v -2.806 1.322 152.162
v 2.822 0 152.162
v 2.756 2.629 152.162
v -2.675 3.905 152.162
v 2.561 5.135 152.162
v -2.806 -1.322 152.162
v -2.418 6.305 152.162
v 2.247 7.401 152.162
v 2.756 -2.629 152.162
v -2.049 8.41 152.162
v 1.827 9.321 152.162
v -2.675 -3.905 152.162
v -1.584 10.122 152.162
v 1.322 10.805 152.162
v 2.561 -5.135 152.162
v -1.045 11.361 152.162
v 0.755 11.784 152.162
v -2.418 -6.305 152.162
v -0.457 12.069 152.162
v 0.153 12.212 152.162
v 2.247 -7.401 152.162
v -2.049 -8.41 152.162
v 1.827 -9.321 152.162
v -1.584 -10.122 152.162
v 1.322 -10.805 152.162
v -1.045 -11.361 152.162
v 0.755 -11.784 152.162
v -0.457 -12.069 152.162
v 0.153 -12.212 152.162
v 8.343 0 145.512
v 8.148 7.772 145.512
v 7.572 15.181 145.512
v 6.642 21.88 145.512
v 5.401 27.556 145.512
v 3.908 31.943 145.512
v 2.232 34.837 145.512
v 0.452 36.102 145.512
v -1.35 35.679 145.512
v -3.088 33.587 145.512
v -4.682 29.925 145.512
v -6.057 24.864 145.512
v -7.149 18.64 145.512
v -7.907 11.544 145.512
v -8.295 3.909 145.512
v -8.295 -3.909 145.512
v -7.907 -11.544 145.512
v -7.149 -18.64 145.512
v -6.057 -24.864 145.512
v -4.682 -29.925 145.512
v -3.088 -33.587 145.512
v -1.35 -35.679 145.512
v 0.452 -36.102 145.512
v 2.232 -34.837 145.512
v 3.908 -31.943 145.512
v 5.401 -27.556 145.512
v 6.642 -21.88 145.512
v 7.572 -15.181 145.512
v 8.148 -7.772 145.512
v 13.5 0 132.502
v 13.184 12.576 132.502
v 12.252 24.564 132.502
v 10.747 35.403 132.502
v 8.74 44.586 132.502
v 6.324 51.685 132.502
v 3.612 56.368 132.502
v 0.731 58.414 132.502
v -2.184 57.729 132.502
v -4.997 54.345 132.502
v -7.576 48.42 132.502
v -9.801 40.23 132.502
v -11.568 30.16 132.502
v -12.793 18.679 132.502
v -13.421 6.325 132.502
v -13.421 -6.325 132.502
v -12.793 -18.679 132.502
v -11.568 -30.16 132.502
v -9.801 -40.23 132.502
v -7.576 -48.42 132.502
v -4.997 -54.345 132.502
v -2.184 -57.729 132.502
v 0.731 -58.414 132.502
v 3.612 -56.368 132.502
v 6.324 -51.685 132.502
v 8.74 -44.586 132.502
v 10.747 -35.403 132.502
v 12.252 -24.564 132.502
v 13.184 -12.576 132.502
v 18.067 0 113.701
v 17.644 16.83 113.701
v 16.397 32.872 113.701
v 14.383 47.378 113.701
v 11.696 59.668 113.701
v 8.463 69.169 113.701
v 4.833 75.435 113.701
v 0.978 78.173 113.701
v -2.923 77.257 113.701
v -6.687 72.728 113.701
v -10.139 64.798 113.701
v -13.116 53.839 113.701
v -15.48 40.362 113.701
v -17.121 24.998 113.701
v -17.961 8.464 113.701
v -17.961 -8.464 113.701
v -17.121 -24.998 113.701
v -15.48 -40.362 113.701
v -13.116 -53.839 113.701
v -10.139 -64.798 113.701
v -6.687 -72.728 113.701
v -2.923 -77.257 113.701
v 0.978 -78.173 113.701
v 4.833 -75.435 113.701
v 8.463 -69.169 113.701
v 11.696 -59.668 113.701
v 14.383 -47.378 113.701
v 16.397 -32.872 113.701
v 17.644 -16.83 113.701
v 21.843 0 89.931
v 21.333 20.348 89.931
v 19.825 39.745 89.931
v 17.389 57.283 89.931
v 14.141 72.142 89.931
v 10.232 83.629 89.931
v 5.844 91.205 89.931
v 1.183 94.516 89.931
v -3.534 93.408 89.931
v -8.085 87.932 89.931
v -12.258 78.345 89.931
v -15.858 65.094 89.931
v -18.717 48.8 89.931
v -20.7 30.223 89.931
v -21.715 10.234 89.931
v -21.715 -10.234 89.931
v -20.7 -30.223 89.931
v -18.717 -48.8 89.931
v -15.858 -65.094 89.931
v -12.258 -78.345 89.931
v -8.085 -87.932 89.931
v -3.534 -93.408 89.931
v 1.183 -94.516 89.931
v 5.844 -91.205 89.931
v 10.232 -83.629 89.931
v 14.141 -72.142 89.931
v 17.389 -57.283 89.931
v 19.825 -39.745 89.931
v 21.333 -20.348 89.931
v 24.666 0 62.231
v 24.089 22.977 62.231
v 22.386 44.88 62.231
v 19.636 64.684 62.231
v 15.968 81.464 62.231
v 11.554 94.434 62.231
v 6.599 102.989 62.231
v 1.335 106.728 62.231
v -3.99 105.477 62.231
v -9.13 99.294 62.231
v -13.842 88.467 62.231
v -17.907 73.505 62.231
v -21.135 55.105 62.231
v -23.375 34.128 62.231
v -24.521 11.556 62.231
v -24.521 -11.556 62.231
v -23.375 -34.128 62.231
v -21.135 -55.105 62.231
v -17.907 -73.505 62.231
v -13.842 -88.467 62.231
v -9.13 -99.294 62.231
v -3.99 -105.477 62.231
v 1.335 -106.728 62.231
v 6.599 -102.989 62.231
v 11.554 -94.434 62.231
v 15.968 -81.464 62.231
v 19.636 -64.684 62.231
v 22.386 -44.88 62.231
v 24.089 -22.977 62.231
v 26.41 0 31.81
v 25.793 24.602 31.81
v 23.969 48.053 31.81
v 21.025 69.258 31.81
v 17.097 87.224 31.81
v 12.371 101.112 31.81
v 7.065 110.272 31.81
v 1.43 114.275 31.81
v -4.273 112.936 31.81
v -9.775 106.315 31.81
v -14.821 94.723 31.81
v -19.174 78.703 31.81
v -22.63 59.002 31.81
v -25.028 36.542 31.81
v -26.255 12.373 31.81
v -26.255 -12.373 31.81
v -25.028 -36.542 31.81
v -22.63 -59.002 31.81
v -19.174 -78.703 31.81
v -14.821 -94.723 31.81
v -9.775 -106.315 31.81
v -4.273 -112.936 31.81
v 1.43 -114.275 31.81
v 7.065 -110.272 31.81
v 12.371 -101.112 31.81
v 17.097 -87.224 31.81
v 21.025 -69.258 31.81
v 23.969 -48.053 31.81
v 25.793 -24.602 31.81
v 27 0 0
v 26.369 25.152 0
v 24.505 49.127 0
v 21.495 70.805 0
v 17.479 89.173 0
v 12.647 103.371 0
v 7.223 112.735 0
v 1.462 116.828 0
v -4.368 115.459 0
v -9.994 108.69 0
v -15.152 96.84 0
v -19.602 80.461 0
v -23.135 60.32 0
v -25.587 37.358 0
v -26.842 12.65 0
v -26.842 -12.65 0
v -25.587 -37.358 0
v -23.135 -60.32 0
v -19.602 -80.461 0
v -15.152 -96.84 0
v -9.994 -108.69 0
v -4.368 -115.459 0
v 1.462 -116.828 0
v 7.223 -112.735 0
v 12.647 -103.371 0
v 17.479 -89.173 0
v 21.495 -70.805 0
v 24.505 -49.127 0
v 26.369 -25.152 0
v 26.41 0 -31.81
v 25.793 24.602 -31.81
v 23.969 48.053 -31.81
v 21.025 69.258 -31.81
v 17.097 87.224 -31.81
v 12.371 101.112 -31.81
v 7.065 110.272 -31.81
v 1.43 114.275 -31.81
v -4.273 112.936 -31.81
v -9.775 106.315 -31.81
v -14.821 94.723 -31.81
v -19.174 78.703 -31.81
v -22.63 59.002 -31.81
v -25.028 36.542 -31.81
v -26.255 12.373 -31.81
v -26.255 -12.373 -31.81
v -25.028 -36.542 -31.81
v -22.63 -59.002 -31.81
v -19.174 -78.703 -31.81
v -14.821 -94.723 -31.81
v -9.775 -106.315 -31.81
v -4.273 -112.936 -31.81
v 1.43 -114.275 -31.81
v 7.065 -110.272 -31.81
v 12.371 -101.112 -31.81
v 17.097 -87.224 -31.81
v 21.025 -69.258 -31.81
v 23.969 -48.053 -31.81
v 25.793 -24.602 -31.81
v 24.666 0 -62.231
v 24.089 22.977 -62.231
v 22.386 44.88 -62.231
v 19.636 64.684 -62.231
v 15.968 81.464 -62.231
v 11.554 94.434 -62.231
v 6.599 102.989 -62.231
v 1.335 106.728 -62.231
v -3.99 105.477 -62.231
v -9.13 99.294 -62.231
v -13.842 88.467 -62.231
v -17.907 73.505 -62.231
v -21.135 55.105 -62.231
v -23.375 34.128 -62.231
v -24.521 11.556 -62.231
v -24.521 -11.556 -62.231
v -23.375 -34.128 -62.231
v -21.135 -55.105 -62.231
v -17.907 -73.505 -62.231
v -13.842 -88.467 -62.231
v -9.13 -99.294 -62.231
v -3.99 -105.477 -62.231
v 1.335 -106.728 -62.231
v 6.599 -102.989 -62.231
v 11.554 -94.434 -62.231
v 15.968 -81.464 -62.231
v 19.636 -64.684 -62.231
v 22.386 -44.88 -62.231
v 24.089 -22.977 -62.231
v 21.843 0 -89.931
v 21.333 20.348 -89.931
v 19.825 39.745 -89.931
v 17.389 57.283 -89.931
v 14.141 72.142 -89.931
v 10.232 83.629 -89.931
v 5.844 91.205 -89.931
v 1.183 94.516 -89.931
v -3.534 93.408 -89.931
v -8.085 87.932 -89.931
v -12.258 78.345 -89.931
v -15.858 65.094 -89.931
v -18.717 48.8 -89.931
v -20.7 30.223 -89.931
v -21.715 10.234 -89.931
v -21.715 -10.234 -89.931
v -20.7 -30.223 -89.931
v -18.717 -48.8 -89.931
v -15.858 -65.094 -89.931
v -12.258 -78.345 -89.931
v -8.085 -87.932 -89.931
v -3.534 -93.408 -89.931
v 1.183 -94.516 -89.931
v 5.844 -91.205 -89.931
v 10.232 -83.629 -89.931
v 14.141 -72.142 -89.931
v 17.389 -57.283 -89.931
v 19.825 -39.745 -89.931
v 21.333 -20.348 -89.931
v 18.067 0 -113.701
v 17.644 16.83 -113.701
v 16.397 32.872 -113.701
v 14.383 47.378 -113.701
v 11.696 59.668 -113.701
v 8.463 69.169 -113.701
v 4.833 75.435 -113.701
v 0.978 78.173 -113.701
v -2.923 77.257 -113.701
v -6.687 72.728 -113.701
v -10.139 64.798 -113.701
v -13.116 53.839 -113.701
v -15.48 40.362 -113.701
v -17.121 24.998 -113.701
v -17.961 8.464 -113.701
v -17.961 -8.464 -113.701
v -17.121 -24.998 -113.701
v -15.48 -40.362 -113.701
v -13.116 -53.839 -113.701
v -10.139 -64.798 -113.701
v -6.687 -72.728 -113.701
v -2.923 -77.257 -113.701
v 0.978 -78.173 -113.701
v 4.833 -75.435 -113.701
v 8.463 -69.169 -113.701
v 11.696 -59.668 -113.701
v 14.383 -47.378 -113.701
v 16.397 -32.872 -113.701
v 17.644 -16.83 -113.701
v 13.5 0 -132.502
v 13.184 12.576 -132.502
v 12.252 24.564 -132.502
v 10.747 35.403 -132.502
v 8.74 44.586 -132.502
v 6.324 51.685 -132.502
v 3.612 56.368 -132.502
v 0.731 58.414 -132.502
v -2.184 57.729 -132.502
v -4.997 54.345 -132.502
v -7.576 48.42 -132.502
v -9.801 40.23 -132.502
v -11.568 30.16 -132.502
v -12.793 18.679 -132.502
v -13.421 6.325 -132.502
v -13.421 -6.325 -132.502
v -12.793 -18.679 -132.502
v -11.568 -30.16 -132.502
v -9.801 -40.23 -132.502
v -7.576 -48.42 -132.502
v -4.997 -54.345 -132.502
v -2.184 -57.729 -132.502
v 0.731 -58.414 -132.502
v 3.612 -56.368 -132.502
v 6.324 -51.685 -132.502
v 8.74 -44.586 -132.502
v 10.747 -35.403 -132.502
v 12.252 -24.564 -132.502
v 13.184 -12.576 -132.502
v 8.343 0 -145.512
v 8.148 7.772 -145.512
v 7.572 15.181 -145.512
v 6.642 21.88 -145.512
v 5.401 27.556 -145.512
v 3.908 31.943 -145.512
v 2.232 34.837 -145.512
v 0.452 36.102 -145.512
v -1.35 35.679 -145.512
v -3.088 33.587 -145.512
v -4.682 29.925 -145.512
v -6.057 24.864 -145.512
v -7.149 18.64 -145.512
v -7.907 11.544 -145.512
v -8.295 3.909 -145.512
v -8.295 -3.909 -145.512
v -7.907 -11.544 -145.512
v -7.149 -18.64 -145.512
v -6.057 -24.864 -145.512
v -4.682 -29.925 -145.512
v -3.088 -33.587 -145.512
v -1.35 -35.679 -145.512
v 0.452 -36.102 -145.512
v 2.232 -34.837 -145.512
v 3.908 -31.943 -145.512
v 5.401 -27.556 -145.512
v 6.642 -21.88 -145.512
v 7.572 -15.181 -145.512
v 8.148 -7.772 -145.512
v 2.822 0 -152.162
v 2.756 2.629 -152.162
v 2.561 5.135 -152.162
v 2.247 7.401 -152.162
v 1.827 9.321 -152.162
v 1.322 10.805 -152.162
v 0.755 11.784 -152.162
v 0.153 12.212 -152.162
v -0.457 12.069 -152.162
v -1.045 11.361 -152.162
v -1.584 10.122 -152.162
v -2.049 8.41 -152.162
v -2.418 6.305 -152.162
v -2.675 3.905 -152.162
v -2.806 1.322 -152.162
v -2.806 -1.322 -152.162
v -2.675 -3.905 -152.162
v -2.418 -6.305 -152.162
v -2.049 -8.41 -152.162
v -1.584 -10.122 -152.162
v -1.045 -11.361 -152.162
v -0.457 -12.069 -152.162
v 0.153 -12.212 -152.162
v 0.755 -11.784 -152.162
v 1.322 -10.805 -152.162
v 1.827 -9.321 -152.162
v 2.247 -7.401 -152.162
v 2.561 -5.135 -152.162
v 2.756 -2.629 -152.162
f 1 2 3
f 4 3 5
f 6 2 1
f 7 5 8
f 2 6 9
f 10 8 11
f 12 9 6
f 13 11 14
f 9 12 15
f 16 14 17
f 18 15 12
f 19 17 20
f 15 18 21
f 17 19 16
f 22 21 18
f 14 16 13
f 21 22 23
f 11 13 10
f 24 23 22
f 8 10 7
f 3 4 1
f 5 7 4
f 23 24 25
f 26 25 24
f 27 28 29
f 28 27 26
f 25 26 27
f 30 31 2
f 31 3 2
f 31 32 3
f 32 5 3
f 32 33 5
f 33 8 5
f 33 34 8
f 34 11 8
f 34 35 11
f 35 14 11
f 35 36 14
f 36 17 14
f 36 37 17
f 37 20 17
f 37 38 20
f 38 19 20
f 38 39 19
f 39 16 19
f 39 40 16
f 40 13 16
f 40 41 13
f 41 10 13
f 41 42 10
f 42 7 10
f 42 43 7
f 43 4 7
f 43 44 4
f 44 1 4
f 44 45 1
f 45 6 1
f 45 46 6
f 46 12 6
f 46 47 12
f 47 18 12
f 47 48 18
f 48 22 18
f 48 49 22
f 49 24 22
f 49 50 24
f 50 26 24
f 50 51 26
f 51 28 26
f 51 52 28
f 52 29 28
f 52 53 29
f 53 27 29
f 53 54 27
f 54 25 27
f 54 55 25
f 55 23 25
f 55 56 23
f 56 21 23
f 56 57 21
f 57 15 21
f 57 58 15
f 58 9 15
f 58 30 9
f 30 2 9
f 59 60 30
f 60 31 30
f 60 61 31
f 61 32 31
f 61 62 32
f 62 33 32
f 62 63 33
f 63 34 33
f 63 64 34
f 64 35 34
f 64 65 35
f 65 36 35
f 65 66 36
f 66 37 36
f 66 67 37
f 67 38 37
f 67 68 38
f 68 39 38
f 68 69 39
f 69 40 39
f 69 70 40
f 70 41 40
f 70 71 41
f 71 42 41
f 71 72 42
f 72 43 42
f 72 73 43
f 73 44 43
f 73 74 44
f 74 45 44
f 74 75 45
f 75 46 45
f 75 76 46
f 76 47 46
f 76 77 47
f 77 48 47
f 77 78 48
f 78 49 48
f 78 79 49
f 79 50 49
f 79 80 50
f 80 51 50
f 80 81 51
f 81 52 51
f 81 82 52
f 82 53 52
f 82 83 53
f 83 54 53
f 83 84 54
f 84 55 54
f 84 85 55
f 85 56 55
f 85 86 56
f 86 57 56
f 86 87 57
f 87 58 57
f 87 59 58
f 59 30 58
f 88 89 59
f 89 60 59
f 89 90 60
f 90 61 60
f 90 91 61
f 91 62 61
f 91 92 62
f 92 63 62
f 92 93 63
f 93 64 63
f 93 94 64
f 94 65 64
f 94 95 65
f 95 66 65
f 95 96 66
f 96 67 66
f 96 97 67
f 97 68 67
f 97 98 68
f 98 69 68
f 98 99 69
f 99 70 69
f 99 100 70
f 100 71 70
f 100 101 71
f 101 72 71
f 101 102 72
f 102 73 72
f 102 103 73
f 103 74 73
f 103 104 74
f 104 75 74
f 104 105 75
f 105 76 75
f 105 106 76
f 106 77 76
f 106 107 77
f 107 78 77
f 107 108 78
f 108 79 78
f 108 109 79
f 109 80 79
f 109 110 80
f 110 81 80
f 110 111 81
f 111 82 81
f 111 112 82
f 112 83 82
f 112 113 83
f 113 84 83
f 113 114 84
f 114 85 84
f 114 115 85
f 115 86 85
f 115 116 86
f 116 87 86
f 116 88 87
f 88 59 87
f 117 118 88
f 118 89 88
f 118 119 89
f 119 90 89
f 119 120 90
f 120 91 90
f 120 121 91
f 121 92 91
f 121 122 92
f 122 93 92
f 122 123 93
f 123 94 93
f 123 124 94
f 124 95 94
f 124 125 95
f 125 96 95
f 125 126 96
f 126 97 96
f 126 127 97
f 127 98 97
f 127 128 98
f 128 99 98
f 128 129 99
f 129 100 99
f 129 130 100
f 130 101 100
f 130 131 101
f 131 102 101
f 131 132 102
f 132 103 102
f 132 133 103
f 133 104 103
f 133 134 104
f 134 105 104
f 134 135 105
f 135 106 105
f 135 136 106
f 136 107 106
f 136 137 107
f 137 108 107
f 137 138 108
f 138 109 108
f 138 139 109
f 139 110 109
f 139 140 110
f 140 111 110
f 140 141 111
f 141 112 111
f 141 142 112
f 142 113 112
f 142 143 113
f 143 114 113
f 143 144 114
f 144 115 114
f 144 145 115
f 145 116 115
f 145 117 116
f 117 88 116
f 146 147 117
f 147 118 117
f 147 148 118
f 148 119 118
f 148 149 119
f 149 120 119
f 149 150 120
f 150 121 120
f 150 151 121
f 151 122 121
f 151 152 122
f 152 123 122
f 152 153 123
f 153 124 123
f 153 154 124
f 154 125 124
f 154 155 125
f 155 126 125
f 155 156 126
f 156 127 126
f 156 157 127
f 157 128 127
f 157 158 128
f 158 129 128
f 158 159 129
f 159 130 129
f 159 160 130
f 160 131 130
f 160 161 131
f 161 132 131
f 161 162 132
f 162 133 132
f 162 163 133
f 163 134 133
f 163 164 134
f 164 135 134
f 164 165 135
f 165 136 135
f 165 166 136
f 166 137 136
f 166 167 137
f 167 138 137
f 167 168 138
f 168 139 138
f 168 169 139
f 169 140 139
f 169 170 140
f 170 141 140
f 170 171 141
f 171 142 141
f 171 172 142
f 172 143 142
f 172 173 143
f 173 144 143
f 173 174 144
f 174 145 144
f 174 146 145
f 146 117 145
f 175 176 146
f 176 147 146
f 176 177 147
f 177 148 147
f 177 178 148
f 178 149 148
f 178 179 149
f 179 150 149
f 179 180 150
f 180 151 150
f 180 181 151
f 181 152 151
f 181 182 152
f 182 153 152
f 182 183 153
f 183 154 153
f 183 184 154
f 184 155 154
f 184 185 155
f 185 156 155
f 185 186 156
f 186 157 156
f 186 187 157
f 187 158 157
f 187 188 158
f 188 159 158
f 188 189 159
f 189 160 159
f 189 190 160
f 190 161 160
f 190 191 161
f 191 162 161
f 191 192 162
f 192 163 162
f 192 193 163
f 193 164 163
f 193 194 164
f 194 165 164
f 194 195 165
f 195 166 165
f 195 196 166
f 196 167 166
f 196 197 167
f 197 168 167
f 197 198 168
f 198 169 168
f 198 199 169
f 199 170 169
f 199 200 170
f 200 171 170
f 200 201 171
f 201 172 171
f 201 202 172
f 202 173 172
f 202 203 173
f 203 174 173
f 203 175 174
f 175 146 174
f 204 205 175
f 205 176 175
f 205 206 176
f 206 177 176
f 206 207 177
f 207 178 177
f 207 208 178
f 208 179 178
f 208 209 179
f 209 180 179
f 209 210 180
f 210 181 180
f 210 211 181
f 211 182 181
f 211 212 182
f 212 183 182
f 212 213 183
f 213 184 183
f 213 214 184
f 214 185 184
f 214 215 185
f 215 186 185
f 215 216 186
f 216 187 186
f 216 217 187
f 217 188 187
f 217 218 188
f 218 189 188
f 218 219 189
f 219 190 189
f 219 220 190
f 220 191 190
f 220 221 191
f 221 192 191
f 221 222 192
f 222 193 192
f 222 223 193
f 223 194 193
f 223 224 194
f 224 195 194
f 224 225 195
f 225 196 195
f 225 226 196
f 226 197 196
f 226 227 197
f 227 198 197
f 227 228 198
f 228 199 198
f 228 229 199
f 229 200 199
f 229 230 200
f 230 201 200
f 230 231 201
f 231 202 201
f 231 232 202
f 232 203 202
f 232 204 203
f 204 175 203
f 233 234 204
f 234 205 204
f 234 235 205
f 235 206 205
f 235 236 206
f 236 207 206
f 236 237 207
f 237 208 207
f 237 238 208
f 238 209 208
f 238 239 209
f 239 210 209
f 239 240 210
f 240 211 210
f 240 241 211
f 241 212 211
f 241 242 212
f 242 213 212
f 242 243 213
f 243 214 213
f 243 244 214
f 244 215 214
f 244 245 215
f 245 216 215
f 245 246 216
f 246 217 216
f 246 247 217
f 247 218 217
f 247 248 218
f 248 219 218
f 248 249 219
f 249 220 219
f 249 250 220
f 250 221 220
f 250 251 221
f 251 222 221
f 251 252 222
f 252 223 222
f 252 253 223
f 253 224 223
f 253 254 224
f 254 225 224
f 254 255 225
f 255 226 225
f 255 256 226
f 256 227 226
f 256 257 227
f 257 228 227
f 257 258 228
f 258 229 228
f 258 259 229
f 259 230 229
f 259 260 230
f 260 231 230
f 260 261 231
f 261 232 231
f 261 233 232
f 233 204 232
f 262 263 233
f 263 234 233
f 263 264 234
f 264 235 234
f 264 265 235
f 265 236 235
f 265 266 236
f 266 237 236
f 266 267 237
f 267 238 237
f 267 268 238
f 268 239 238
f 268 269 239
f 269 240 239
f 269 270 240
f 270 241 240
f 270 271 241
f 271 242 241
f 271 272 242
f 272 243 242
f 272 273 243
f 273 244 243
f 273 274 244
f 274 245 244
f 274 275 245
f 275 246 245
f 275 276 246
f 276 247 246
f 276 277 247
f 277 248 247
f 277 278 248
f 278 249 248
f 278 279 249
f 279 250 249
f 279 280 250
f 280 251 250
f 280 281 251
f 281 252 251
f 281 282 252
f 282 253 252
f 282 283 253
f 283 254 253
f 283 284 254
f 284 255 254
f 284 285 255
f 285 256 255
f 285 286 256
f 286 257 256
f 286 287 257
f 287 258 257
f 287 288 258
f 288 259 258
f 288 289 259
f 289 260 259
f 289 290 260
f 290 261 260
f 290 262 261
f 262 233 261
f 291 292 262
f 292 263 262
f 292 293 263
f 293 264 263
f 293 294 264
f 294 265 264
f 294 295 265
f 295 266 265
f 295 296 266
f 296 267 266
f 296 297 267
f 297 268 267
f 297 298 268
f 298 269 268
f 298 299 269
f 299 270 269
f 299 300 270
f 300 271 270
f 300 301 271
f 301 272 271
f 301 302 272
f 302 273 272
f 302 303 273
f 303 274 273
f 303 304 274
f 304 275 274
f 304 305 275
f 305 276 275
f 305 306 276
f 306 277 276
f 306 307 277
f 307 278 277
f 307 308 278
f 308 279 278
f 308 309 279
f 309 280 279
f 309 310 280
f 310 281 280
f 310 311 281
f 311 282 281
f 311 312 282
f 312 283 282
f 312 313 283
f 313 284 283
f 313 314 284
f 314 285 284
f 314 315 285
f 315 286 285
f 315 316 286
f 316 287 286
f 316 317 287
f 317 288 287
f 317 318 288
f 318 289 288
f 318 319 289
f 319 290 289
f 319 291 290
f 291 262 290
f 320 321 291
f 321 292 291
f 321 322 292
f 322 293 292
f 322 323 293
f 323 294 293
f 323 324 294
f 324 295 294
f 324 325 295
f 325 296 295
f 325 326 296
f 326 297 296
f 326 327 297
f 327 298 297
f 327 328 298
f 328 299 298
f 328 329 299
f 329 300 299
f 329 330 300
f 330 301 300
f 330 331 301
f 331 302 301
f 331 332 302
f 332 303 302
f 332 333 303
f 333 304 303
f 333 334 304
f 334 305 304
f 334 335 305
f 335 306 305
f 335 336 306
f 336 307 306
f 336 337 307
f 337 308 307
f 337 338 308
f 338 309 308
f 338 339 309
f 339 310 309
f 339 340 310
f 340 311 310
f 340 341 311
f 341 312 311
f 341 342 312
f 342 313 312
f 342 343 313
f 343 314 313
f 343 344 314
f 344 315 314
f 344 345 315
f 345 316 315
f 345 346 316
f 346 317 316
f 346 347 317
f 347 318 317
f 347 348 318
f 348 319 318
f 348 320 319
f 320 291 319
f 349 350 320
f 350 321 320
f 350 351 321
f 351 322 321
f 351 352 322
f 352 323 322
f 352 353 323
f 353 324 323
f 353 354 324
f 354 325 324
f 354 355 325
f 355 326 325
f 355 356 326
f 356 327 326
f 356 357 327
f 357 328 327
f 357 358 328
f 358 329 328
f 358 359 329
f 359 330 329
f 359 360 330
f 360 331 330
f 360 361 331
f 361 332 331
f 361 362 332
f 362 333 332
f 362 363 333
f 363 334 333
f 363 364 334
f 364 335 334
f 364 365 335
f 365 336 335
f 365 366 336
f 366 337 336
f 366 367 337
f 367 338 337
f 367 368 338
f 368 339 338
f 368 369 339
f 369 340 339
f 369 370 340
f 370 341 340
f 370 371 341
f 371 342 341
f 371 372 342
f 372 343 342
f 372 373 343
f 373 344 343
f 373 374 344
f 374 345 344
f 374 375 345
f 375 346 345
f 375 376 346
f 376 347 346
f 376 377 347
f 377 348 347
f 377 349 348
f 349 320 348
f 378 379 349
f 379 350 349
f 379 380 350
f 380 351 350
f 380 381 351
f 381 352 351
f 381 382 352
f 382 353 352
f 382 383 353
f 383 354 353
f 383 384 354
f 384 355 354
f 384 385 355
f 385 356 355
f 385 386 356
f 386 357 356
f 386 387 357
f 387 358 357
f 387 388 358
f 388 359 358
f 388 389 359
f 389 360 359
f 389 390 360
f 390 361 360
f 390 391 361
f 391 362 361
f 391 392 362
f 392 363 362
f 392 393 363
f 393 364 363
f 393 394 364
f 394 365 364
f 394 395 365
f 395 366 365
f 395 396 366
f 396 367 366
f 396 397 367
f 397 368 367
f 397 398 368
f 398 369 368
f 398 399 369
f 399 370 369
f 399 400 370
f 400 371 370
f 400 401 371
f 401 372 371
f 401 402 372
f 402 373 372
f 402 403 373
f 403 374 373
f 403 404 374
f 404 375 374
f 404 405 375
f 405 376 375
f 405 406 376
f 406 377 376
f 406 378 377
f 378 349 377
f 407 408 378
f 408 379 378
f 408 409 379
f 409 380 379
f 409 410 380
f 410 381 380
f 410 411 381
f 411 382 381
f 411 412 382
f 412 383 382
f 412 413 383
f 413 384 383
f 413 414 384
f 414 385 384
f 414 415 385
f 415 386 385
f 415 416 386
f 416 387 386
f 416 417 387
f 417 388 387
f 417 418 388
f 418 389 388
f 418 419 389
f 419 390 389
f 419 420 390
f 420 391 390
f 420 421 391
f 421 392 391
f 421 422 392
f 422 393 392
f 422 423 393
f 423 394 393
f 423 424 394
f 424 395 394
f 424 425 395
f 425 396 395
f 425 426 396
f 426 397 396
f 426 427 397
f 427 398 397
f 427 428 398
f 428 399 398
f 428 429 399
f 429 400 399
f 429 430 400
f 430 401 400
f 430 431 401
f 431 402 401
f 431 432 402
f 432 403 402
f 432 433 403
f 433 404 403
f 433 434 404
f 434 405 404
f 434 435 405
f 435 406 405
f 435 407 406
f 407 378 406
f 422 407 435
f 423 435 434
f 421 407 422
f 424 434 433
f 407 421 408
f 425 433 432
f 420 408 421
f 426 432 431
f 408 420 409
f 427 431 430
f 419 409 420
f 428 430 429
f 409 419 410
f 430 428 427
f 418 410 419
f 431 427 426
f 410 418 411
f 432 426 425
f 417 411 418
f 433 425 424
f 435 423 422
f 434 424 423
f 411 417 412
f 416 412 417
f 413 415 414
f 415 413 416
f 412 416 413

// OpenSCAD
// Generated by SolidPython 1.0.1 on 2020-07-29 00:46:45


scale(v = [3, 13, 17]) {
	sphere(r = 9);
}
/***********************************************
*********      SolidPython code:      **********
************************************************
 
# import packages: SolidPython
from solid import *
from solid.utils import *
from itertools import chain, combinations, permutations


class Resize:

    def __init__(self, scad_file):
        self.scad_file = scad_file
        #self.scad_file = import_scad(scad_file)
        # cone/cylinder param:
        self.r1 = 0
        self.r2 = 0
        self.h = 0
        # rectangular prism param:
        self.w = 0
        self.l = 0
        # ellipse param:
        self.r = 0

    # import OpenScad code (file name corresponds to shape)


    # classify shape + parameters
    def assign(self, param1, param2, param3):
        if self.scad_file == 'cone.scad':
            self.r1 = param1
            self.r2 = param2
            self.h = param3
        elif self.scad_file == 'cylinder.scad':
            self.r1 = param1
            self.r2 = param2
            self.h = param3
        elif self.scad_file == 'rectangularPrism.scad':
            self.h = param1
            self.l = param2
            self.w = param3
        else:
            self.r = param1
            self.h = param2

    # resize parameters
    def iterate(self):
        x = range(3, 20, 2)
        i = 1
        if self.scad_file == 'cone.scad':
            tempList = list(permutations(x, 2))
            for temp in tempList:
                param1 = temp[0]
                param2 = temp[1]
                filepath = 'produced_scad_files/' + 'cone' + str(param1) + '_' + str(param2) + '_' + '.scad'
                scad_render_to_file(cylinder(h=param1, r1=param2, r2=0), filepath)

        elif self.scad_file == 'cylinder.scad':
            tempList = list(permutations(x, 3))
            for temp in tempList:
                param1 = temp[0]
                param2 = temp[1]
                filepath = 'produced_scad_files/' + 'cylinder' + str(param1) + '_' + str(param2) + '_' + '.scad'
                scad_render_to_file(cylinder(h=param1, r1=param2, r2=param2), filepath)

        elif self.scad_file == 'rectangularPrism.scad':
            tempList = list(permutations(x, 3))
            for temp in tempList:
                param1 = temp[0]
                param2 = temp[1]
                param3 = temp[2]
                filepath = 'produced_scad_files/' + 'rectangularPrism' + str(param1) + '_' + str(param2) + '_' + str(
                    param3) + '.scad'
                scad_render_to_file(cube(size=(param1, param2, param3)), filepath)

        elif self.scad_file == 'ellipse.scad':
            tempList = list(permutations(x, 4))
            for temp in tempList:
                param1 = temp[0]
                param2 = temp[1]
                param3 = temp[2]
                param4 = temp[3]
                filepath = 'produced_scad_files/' + 'ellipse' + str(param1) + '_' + str(param2) + '_' + str(param3) + '_' + str(param4) + '.scad'
                scad_render_to_file(scale([param1, param2, param3])(sphere(r=param4)), filepath)

    def render_to_scadfile(self):
        scad_render_to_file(scad, 'example.scad') 
 
************************************************/
